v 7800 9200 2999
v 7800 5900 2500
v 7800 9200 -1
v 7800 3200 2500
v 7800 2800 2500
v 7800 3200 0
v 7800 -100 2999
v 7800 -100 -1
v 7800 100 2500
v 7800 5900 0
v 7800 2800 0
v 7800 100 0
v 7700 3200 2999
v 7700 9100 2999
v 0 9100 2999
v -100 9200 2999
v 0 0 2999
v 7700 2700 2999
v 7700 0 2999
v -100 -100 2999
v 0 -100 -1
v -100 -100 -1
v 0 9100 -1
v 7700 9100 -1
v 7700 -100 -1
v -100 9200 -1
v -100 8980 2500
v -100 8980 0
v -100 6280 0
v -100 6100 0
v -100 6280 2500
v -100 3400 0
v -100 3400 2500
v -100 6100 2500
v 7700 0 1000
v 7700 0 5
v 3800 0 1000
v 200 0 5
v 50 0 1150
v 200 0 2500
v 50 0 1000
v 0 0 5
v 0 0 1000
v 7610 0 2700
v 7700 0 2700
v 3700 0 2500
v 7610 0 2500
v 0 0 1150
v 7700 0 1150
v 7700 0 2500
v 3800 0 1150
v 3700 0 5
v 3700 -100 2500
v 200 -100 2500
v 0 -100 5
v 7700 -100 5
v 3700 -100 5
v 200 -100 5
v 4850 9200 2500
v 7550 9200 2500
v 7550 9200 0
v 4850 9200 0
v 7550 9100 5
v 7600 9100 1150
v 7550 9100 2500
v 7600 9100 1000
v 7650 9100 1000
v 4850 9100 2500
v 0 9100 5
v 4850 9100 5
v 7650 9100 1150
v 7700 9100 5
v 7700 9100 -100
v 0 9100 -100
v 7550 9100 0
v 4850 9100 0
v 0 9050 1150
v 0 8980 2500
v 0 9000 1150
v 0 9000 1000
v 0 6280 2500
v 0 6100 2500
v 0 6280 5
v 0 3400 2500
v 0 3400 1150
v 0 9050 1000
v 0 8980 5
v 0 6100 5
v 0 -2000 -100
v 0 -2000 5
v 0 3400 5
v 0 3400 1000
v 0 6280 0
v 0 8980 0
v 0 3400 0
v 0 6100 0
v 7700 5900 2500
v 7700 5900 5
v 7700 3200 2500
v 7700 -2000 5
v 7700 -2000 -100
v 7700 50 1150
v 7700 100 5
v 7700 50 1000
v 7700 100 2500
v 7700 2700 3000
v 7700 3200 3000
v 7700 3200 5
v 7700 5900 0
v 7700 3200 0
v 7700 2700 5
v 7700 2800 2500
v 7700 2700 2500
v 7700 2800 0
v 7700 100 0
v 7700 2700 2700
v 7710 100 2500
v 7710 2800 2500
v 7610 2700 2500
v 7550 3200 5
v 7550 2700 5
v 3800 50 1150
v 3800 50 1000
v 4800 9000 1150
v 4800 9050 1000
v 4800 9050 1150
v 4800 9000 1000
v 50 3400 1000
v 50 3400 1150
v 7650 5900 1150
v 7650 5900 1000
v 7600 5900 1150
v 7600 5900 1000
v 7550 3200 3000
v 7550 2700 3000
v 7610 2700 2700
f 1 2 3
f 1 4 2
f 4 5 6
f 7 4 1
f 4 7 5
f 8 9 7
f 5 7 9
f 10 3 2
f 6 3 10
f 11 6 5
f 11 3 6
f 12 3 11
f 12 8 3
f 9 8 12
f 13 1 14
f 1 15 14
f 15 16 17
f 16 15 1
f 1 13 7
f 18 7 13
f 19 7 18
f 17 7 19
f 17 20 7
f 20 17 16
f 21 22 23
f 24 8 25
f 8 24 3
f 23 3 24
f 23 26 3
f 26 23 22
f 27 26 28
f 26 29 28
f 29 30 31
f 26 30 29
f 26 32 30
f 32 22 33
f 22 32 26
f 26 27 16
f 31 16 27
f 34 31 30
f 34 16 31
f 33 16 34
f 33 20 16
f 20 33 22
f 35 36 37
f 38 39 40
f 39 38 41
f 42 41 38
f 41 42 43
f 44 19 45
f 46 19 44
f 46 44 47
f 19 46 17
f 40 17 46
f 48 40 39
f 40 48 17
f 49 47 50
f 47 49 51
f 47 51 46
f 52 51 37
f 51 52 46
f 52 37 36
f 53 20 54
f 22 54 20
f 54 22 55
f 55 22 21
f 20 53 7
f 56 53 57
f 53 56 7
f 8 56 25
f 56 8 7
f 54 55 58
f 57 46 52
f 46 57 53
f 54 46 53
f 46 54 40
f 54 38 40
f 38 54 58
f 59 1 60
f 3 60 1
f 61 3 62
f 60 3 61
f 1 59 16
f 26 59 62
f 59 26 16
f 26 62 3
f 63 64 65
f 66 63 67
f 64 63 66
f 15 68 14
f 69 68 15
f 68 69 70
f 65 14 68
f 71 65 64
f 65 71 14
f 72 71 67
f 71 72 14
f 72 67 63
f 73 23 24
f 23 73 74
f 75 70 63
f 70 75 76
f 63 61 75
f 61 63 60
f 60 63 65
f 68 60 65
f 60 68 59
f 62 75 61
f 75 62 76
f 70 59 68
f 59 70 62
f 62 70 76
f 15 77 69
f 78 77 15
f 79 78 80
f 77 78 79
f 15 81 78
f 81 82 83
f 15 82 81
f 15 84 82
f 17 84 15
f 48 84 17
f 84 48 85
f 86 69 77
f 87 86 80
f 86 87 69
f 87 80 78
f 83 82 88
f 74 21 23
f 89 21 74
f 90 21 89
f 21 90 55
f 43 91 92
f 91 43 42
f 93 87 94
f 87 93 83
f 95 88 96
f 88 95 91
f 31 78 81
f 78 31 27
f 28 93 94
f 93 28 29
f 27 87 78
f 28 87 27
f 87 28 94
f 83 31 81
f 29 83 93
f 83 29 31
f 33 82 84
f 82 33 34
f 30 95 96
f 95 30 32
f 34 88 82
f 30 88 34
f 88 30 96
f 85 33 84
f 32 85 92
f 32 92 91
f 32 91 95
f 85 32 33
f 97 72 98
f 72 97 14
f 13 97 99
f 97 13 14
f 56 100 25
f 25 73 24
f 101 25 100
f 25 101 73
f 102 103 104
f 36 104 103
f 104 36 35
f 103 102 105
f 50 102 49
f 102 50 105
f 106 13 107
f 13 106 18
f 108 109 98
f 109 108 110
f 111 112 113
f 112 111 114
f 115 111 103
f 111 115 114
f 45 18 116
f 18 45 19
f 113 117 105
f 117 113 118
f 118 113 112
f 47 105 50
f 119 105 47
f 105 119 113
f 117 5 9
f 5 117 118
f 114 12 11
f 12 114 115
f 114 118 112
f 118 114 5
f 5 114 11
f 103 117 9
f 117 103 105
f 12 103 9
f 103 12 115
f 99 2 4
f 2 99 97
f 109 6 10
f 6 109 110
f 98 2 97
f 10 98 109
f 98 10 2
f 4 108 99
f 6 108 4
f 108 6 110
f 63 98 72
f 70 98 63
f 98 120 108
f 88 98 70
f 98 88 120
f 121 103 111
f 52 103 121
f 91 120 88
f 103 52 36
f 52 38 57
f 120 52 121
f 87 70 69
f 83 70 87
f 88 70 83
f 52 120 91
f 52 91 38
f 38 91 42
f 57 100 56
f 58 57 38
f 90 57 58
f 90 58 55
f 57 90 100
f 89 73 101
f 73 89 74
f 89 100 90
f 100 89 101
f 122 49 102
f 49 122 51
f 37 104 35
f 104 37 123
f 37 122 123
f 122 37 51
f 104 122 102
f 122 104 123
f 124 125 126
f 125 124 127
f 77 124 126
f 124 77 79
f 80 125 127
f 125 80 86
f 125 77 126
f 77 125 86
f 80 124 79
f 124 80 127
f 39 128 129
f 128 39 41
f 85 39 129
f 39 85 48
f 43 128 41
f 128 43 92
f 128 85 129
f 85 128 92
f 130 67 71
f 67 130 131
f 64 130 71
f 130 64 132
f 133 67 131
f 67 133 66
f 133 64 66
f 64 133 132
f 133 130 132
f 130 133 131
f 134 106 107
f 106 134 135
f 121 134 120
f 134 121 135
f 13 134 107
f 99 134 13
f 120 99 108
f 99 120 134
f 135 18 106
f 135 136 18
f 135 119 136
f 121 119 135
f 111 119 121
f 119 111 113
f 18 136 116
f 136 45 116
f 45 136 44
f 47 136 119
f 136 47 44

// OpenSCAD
//main dim


ix = 7700;
iy = 9100;
iz = 3000;
wall_t = 100;
wx = 2700;
wy = 2700;
wz = 2500;

wood_c = "wheat";
floor_c = "Silver";
glass = [];

// floor
//color(floor_c)
//cube([ix, iy, 100]);
translate([0, 0, -100])
    color(floor_c)
    cube([ix, iy, 105]);

// entrance
translate([0, -2000, -100])
    color(floor_c)
    cube([ix, 2000, 105]);

// power & network banks
pd = 50;
pz = 150;
pz_o = 1000;
color_r = "White";

// wall a
difference(){
translate([-wall_t, -wall_t, -1])
    color(wood_c)
    cube([ix+2*wall_t, wall_t, iz]);
translate([200, -wy/2, 0])
    color("Black")
    cube([3500, wy, wz]);
};
xv = 3900;    
translate([ix-xv, 0, pz_o])
    color(color_r)
    cube([xv, pd, pz]);

// wall b
offset_b = 5000;
difference(){
translate([-wall_t, iy, -1])
    color(wood_c)
    cube([ix+2*wall_t, wall_t, iz]);
translate([offset_b-150, iy-wy/2, 0])
    color("Black")
    cube([wx, wy, wz]);
}
translate([0, iy-wall_t, pz_o])
    color(color_r)
    cube([4800, pd, pz]);

// wall c
offset_c = 6500;
difference(){
translate([-wall_t, 0, -1])
    color(wood_c)
    cube([wall_t, iy, iz]);
translate([-wx/2, offset_c-220, 0])
    color("Black")
    cube([wx, wy, wz]);
translate([-wx/2, offset_c-3100, 0])
    color("Black")
    cube([wx, wy, wz]);
}
translate([0, 0, pz_o])
    color(color_r)
    cube([pd, 3400, pz]);

// wall d
offset_d = 100;
difference(){
translate([ix, 0, -1])
    color(wood_c)
    cube([wall_t, iy, iz]);
translate([ix-wx/2, offset_d, 0])
    color("Black")
    cube([wx, wy, wz]);
translate([ix-wx/2, offset_d+3100, 0])
    color("Black")
    cube([wx, wy, wz]);
}
yv = 3200;
translate([ix-wall_t, iy-yv, pz_o])
    color(color_r)
    cube([pd, yv, pz]);

// windows
//glass_t = 0.5;
//
//translate([offset_b-150, iy+50, 0])
//    color([0.9, 0.9, 0.9, glass_t])
//    cube([wx, 10, wz]);
//
//
//translate([-50, offset_c-200, 0])
//    color([0.9, 0.9, 0.9, glass_t])
//    cube([10, wy, wz]);
//translate([-50, offset_c-3100, 0])
//    color([0.9, 0.9, 0.9, glass_t])
//    cube([10, wy, wz]);
//
//translate([ix+50, offset_d, 0])
//    color([0.9, 0.9, 0.9, glass_t])
//    cube([10, wy, wz]);
//translate([ix+50, offset_d+3100, 0])
//    color([0.9, 0.9, 0.9, glass_t])
//    cube([10, wy, wz]);



// support column
translate([ix-150, 2700, 5])
    color("black")
    cube([150, 500, iz-5]);
    
translate([ix-90, 0, 2500])
    color("black")
    cube([100, 3000, 200]);








    
